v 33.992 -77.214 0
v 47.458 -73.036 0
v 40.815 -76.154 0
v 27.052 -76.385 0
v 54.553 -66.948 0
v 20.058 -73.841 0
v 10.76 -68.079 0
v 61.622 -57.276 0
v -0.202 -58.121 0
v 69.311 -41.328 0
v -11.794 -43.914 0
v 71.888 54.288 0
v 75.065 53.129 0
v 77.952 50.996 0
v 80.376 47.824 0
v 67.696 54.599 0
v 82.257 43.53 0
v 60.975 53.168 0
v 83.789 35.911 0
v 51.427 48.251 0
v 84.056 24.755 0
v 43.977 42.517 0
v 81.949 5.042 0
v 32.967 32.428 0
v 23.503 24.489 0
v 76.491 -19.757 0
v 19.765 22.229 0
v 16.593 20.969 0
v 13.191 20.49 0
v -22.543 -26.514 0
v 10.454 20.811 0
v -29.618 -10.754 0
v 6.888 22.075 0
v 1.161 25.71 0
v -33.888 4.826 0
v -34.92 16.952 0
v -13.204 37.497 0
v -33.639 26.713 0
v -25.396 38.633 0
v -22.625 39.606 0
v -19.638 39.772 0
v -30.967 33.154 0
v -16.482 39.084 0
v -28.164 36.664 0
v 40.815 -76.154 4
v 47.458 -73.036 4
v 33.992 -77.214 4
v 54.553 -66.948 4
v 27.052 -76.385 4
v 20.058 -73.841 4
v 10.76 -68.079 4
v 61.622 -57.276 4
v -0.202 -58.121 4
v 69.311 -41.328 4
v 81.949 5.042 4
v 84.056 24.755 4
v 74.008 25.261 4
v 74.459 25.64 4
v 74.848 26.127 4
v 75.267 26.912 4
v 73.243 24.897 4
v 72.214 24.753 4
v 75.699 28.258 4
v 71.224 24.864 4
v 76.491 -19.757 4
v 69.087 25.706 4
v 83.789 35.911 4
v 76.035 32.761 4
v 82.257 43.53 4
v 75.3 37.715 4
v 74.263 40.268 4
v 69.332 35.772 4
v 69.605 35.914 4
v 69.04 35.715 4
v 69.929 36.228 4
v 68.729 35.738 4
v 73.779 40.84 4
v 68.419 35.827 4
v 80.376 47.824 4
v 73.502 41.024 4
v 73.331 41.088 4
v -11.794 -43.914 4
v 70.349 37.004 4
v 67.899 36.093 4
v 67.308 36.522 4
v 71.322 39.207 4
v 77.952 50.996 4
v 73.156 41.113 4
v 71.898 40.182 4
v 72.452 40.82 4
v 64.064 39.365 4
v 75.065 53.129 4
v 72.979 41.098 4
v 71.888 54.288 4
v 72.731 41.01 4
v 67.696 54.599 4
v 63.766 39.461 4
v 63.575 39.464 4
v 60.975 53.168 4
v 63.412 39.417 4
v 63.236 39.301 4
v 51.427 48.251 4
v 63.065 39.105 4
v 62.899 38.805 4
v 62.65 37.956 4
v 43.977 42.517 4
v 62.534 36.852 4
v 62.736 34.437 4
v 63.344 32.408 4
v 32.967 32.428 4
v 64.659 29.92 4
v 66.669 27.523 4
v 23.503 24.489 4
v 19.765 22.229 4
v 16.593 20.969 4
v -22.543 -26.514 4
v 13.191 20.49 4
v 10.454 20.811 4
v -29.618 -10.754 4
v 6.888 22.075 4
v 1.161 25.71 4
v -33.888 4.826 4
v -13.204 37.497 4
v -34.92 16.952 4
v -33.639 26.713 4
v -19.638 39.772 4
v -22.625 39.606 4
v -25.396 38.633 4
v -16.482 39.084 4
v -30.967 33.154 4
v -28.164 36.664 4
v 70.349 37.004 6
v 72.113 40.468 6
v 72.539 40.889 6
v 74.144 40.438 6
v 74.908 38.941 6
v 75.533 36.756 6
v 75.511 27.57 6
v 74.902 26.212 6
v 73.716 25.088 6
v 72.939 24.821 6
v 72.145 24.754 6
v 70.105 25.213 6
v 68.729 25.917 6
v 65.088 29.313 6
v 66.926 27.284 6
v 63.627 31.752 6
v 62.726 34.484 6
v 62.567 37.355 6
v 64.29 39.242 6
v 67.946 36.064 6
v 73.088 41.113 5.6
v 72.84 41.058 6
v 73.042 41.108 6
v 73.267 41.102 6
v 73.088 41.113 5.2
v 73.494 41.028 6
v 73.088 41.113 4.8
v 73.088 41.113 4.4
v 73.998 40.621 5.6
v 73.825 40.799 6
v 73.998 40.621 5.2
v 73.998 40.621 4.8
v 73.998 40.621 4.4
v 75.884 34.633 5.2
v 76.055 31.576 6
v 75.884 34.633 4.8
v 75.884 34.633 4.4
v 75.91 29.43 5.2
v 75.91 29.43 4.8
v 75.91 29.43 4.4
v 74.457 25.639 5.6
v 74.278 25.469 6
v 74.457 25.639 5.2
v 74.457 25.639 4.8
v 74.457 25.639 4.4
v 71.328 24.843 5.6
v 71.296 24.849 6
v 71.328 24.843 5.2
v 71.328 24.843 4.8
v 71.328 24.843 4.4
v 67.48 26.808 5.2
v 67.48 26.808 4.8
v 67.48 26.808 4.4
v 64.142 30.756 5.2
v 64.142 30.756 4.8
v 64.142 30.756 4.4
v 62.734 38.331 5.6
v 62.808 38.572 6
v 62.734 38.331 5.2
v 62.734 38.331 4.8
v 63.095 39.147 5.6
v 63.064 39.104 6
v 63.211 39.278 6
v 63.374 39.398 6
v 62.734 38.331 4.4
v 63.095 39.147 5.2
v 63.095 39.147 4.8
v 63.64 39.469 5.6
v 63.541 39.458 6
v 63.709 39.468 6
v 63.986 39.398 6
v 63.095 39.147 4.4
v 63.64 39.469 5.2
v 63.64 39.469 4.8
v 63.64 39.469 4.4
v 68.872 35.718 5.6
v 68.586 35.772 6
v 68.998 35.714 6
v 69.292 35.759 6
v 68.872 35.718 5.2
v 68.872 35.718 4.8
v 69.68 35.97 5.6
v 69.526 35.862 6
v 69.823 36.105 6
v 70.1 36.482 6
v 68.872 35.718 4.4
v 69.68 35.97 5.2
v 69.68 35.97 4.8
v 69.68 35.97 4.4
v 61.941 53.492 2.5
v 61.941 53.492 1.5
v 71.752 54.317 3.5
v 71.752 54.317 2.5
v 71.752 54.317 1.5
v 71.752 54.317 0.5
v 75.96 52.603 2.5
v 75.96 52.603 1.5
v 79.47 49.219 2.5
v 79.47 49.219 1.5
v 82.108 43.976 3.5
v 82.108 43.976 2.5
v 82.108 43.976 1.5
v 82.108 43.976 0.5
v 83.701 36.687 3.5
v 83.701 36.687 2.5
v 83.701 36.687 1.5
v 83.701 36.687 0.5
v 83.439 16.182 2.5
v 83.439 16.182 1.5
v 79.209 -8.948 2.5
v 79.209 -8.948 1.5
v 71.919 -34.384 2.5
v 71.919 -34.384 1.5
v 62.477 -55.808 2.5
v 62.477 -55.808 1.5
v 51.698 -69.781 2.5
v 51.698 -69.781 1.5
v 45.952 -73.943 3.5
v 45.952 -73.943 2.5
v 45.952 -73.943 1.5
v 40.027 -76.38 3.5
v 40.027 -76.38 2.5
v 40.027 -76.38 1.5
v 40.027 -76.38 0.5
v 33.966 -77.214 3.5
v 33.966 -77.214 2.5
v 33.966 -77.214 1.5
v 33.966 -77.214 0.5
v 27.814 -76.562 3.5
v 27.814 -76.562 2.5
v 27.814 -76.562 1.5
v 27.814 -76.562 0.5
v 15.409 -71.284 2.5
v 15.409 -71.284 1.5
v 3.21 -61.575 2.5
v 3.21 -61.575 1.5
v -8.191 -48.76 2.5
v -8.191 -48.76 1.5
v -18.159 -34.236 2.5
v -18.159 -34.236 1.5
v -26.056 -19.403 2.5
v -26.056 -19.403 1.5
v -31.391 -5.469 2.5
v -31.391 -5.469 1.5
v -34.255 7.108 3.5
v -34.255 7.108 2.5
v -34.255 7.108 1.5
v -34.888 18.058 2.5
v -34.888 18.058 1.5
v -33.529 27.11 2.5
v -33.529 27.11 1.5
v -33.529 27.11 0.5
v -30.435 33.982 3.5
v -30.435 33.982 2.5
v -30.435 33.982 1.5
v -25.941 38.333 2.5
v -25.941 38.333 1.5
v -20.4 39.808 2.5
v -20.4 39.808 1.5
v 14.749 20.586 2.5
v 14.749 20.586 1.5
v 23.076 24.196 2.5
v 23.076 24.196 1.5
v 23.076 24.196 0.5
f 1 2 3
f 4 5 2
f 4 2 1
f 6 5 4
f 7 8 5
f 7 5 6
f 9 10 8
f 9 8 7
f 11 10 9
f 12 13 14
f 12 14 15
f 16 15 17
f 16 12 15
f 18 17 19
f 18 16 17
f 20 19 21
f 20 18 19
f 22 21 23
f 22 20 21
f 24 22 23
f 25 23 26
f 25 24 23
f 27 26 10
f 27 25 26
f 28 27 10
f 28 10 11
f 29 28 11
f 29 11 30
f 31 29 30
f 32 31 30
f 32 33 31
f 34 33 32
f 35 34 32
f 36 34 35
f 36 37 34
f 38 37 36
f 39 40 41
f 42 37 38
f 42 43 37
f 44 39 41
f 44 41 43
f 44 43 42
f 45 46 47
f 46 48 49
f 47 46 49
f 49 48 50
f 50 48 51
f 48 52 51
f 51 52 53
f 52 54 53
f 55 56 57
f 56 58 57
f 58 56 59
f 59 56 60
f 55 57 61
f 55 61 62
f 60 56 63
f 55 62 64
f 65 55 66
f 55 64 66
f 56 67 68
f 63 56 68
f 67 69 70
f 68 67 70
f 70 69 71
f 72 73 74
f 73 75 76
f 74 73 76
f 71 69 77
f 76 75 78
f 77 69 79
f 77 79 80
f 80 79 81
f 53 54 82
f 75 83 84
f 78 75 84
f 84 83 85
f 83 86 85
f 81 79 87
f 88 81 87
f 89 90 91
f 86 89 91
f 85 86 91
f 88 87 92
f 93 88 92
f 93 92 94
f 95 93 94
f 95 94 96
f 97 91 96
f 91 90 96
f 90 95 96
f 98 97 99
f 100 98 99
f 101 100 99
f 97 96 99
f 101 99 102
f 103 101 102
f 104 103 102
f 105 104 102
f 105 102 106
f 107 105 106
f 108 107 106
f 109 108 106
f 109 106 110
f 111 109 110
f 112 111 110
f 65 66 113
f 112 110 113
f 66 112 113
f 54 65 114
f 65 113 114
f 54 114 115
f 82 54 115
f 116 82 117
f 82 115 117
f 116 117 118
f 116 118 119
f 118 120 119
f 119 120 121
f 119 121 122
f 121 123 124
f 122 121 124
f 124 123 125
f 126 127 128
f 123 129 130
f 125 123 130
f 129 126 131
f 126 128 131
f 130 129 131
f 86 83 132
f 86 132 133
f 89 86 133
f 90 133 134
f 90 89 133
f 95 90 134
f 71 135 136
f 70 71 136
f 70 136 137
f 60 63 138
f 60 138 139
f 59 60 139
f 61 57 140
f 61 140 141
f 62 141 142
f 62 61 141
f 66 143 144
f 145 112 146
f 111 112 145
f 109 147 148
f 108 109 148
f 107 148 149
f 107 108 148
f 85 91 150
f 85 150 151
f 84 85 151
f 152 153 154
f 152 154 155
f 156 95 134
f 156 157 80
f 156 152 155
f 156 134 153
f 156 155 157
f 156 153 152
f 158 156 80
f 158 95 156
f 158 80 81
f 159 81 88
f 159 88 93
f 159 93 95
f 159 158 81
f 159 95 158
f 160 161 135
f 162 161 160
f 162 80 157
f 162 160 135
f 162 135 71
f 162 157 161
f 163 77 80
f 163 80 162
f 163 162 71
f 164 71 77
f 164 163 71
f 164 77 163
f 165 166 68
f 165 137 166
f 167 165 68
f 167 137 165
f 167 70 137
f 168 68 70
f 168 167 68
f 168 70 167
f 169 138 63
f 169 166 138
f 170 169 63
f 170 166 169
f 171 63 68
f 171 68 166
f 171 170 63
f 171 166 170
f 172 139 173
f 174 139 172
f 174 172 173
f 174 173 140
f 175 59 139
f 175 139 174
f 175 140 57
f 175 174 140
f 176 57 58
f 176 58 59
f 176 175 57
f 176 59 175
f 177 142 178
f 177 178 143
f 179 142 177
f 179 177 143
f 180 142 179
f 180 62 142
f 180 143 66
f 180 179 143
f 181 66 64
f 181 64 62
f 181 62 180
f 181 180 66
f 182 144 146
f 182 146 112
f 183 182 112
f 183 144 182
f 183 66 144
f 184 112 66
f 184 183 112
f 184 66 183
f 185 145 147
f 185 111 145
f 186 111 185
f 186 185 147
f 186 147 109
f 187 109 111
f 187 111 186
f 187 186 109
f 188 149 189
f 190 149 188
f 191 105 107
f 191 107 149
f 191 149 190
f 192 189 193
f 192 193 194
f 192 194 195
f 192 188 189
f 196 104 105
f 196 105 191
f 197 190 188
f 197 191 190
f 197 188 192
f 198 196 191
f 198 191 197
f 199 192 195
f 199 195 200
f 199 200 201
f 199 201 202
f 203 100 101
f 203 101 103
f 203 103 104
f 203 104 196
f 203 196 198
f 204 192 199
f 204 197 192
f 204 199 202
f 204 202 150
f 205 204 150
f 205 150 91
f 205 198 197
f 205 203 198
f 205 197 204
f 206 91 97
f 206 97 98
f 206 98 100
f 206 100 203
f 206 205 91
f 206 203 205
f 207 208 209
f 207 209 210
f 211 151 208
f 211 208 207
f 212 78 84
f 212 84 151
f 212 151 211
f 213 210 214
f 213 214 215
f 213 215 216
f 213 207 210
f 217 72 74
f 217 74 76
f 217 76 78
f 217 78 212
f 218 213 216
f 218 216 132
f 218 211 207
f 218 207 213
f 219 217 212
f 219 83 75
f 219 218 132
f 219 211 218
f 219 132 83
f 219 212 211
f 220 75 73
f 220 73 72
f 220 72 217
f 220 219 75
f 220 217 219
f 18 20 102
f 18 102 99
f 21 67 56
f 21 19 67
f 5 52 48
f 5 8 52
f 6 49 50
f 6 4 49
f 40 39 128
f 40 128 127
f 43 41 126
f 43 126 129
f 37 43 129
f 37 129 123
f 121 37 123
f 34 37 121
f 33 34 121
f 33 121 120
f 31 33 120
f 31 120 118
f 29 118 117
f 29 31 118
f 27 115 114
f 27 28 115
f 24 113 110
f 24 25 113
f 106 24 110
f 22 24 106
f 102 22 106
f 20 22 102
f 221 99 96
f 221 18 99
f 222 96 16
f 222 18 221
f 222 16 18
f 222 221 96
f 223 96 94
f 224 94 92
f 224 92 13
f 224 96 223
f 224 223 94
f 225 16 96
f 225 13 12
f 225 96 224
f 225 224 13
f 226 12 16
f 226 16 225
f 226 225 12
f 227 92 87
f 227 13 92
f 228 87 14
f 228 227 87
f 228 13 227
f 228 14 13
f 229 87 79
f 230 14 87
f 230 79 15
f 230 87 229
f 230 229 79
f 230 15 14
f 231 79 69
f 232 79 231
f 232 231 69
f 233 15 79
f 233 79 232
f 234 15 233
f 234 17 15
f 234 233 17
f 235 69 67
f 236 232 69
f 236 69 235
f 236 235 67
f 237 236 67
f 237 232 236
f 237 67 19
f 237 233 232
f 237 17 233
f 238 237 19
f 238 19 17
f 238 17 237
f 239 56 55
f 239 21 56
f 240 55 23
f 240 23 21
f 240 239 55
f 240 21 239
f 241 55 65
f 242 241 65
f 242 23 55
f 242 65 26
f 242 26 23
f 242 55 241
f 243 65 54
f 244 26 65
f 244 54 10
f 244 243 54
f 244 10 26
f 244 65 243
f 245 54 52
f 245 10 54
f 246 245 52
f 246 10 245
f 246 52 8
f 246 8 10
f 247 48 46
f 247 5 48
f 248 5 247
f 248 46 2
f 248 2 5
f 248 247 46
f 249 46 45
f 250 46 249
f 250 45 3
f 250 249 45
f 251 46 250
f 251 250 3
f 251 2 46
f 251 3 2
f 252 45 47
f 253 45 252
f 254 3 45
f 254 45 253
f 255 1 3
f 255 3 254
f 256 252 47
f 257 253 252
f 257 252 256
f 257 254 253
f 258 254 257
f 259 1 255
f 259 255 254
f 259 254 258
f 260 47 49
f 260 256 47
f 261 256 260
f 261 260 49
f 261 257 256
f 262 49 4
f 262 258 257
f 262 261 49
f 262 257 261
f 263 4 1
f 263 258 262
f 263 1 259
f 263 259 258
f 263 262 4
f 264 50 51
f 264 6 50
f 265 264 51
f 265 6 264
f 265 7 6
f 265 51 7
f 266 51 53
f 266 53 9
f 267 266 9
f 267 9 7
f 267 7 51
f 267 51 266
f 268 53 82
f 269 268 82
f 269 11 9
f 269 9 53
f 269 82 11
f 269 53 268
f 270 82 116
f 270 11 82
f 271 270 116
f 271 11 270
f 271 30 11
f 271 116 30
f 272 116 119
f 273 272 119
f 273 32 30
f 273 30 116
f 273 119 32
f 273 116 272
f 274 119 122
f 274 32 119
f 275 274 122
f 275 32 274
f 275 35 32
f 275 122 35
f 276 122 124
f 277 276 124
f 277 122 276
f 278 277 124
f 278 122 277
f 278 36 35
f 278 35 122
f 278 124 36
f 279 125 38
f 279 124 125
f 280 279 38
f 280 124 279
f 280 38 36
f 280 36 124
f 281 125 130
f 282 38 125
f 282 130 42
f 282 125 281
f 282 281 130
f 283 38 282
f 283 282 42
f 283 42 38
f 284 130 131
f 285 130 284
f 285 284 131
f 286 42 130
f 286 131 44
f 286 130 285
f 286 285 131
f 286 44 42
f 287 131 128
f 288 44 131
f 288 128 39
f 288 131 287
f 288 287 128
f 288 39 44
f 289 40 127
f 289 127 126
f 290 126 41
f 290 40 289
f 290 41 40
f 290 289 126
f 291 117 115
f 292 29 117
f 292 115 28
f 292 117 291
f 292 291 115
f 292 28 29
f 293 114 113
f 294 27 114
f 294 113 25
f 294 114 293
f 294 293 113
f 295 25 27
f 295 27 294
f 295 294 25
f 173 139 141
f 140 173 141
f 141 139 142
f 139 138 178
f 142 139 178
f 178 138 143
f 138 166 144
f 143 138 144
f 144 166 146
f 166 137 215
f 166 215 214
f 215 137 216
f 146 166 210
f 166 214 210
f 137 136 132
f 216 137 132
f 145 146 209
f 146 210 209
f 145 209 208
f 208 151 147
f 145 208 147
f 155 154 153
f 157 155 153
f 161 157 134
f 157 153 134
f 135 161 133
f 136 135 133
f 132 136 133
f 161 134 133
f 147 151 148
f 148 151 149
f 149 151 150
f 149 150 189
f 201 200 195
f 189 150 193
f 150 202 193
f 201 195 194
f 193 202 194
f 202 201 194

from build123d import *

# Parameters (mm, degrees)
EXTRUDE004_DEPTH = 4
EXTRUDE003_DEPTH = 6


with BuildPart() as heart:
    # Sketch002 → Extrude004 (new body)
    with BuildSketch(Plane.XY):
        with BuildLine():
            add(Edge.make_bspline(
                [(51.427337, 48.250748), (65.296083, 57.51073), (96.705849, 60.535873), (65.792378, -78.022604), (14.984616, -83.29459), (-33.279233, -16.502122), (-38.205514, 32.887674), (-15.071922, 47.613376), (13.49337, 4.975979), (37.55859, 38.990766), (51.427337, 48.250748)],
                knots=[0, 0, 0, 0, 0.125, 0.25, 0.375, 0.5, 0.625, 0.75, 0.875, 1, 1, 1, 1], degree=3))
        make_face()
    extrude(amount=EXTRUDE004_DEPTH)


with BuildPart() as base:
    # Sketch001 → Extrude003 (new body)
    with BuildSketch(Plane(origin=(-5, 0, 0), x_dir=(1, 0, 0), z_dir=(0, 0, 1))):
        with BuildLine():
            add(Edge.make_bspline(
                [(75.3494, 37.0045), (76.42788, 39.752157), (79.987988, 45.201795), (84.547004, 16.279999), (65.993665, 30.045028), (68.445934, 42.898526), (73.787962, 33.026402), (75.3494, 37.0045)],
                knots=[0, 0, 0, 0, 4.937165, 20.471043, 36.199909, 39.924844, 47.072943, 47.072943, 47.072943, 47.072943], degree=3))
        make_face()
    extrude(amount=EXTRUDE003_DEPTH)

    # Fusion001: union Heart
    add(heart.part)


solid = base.part
